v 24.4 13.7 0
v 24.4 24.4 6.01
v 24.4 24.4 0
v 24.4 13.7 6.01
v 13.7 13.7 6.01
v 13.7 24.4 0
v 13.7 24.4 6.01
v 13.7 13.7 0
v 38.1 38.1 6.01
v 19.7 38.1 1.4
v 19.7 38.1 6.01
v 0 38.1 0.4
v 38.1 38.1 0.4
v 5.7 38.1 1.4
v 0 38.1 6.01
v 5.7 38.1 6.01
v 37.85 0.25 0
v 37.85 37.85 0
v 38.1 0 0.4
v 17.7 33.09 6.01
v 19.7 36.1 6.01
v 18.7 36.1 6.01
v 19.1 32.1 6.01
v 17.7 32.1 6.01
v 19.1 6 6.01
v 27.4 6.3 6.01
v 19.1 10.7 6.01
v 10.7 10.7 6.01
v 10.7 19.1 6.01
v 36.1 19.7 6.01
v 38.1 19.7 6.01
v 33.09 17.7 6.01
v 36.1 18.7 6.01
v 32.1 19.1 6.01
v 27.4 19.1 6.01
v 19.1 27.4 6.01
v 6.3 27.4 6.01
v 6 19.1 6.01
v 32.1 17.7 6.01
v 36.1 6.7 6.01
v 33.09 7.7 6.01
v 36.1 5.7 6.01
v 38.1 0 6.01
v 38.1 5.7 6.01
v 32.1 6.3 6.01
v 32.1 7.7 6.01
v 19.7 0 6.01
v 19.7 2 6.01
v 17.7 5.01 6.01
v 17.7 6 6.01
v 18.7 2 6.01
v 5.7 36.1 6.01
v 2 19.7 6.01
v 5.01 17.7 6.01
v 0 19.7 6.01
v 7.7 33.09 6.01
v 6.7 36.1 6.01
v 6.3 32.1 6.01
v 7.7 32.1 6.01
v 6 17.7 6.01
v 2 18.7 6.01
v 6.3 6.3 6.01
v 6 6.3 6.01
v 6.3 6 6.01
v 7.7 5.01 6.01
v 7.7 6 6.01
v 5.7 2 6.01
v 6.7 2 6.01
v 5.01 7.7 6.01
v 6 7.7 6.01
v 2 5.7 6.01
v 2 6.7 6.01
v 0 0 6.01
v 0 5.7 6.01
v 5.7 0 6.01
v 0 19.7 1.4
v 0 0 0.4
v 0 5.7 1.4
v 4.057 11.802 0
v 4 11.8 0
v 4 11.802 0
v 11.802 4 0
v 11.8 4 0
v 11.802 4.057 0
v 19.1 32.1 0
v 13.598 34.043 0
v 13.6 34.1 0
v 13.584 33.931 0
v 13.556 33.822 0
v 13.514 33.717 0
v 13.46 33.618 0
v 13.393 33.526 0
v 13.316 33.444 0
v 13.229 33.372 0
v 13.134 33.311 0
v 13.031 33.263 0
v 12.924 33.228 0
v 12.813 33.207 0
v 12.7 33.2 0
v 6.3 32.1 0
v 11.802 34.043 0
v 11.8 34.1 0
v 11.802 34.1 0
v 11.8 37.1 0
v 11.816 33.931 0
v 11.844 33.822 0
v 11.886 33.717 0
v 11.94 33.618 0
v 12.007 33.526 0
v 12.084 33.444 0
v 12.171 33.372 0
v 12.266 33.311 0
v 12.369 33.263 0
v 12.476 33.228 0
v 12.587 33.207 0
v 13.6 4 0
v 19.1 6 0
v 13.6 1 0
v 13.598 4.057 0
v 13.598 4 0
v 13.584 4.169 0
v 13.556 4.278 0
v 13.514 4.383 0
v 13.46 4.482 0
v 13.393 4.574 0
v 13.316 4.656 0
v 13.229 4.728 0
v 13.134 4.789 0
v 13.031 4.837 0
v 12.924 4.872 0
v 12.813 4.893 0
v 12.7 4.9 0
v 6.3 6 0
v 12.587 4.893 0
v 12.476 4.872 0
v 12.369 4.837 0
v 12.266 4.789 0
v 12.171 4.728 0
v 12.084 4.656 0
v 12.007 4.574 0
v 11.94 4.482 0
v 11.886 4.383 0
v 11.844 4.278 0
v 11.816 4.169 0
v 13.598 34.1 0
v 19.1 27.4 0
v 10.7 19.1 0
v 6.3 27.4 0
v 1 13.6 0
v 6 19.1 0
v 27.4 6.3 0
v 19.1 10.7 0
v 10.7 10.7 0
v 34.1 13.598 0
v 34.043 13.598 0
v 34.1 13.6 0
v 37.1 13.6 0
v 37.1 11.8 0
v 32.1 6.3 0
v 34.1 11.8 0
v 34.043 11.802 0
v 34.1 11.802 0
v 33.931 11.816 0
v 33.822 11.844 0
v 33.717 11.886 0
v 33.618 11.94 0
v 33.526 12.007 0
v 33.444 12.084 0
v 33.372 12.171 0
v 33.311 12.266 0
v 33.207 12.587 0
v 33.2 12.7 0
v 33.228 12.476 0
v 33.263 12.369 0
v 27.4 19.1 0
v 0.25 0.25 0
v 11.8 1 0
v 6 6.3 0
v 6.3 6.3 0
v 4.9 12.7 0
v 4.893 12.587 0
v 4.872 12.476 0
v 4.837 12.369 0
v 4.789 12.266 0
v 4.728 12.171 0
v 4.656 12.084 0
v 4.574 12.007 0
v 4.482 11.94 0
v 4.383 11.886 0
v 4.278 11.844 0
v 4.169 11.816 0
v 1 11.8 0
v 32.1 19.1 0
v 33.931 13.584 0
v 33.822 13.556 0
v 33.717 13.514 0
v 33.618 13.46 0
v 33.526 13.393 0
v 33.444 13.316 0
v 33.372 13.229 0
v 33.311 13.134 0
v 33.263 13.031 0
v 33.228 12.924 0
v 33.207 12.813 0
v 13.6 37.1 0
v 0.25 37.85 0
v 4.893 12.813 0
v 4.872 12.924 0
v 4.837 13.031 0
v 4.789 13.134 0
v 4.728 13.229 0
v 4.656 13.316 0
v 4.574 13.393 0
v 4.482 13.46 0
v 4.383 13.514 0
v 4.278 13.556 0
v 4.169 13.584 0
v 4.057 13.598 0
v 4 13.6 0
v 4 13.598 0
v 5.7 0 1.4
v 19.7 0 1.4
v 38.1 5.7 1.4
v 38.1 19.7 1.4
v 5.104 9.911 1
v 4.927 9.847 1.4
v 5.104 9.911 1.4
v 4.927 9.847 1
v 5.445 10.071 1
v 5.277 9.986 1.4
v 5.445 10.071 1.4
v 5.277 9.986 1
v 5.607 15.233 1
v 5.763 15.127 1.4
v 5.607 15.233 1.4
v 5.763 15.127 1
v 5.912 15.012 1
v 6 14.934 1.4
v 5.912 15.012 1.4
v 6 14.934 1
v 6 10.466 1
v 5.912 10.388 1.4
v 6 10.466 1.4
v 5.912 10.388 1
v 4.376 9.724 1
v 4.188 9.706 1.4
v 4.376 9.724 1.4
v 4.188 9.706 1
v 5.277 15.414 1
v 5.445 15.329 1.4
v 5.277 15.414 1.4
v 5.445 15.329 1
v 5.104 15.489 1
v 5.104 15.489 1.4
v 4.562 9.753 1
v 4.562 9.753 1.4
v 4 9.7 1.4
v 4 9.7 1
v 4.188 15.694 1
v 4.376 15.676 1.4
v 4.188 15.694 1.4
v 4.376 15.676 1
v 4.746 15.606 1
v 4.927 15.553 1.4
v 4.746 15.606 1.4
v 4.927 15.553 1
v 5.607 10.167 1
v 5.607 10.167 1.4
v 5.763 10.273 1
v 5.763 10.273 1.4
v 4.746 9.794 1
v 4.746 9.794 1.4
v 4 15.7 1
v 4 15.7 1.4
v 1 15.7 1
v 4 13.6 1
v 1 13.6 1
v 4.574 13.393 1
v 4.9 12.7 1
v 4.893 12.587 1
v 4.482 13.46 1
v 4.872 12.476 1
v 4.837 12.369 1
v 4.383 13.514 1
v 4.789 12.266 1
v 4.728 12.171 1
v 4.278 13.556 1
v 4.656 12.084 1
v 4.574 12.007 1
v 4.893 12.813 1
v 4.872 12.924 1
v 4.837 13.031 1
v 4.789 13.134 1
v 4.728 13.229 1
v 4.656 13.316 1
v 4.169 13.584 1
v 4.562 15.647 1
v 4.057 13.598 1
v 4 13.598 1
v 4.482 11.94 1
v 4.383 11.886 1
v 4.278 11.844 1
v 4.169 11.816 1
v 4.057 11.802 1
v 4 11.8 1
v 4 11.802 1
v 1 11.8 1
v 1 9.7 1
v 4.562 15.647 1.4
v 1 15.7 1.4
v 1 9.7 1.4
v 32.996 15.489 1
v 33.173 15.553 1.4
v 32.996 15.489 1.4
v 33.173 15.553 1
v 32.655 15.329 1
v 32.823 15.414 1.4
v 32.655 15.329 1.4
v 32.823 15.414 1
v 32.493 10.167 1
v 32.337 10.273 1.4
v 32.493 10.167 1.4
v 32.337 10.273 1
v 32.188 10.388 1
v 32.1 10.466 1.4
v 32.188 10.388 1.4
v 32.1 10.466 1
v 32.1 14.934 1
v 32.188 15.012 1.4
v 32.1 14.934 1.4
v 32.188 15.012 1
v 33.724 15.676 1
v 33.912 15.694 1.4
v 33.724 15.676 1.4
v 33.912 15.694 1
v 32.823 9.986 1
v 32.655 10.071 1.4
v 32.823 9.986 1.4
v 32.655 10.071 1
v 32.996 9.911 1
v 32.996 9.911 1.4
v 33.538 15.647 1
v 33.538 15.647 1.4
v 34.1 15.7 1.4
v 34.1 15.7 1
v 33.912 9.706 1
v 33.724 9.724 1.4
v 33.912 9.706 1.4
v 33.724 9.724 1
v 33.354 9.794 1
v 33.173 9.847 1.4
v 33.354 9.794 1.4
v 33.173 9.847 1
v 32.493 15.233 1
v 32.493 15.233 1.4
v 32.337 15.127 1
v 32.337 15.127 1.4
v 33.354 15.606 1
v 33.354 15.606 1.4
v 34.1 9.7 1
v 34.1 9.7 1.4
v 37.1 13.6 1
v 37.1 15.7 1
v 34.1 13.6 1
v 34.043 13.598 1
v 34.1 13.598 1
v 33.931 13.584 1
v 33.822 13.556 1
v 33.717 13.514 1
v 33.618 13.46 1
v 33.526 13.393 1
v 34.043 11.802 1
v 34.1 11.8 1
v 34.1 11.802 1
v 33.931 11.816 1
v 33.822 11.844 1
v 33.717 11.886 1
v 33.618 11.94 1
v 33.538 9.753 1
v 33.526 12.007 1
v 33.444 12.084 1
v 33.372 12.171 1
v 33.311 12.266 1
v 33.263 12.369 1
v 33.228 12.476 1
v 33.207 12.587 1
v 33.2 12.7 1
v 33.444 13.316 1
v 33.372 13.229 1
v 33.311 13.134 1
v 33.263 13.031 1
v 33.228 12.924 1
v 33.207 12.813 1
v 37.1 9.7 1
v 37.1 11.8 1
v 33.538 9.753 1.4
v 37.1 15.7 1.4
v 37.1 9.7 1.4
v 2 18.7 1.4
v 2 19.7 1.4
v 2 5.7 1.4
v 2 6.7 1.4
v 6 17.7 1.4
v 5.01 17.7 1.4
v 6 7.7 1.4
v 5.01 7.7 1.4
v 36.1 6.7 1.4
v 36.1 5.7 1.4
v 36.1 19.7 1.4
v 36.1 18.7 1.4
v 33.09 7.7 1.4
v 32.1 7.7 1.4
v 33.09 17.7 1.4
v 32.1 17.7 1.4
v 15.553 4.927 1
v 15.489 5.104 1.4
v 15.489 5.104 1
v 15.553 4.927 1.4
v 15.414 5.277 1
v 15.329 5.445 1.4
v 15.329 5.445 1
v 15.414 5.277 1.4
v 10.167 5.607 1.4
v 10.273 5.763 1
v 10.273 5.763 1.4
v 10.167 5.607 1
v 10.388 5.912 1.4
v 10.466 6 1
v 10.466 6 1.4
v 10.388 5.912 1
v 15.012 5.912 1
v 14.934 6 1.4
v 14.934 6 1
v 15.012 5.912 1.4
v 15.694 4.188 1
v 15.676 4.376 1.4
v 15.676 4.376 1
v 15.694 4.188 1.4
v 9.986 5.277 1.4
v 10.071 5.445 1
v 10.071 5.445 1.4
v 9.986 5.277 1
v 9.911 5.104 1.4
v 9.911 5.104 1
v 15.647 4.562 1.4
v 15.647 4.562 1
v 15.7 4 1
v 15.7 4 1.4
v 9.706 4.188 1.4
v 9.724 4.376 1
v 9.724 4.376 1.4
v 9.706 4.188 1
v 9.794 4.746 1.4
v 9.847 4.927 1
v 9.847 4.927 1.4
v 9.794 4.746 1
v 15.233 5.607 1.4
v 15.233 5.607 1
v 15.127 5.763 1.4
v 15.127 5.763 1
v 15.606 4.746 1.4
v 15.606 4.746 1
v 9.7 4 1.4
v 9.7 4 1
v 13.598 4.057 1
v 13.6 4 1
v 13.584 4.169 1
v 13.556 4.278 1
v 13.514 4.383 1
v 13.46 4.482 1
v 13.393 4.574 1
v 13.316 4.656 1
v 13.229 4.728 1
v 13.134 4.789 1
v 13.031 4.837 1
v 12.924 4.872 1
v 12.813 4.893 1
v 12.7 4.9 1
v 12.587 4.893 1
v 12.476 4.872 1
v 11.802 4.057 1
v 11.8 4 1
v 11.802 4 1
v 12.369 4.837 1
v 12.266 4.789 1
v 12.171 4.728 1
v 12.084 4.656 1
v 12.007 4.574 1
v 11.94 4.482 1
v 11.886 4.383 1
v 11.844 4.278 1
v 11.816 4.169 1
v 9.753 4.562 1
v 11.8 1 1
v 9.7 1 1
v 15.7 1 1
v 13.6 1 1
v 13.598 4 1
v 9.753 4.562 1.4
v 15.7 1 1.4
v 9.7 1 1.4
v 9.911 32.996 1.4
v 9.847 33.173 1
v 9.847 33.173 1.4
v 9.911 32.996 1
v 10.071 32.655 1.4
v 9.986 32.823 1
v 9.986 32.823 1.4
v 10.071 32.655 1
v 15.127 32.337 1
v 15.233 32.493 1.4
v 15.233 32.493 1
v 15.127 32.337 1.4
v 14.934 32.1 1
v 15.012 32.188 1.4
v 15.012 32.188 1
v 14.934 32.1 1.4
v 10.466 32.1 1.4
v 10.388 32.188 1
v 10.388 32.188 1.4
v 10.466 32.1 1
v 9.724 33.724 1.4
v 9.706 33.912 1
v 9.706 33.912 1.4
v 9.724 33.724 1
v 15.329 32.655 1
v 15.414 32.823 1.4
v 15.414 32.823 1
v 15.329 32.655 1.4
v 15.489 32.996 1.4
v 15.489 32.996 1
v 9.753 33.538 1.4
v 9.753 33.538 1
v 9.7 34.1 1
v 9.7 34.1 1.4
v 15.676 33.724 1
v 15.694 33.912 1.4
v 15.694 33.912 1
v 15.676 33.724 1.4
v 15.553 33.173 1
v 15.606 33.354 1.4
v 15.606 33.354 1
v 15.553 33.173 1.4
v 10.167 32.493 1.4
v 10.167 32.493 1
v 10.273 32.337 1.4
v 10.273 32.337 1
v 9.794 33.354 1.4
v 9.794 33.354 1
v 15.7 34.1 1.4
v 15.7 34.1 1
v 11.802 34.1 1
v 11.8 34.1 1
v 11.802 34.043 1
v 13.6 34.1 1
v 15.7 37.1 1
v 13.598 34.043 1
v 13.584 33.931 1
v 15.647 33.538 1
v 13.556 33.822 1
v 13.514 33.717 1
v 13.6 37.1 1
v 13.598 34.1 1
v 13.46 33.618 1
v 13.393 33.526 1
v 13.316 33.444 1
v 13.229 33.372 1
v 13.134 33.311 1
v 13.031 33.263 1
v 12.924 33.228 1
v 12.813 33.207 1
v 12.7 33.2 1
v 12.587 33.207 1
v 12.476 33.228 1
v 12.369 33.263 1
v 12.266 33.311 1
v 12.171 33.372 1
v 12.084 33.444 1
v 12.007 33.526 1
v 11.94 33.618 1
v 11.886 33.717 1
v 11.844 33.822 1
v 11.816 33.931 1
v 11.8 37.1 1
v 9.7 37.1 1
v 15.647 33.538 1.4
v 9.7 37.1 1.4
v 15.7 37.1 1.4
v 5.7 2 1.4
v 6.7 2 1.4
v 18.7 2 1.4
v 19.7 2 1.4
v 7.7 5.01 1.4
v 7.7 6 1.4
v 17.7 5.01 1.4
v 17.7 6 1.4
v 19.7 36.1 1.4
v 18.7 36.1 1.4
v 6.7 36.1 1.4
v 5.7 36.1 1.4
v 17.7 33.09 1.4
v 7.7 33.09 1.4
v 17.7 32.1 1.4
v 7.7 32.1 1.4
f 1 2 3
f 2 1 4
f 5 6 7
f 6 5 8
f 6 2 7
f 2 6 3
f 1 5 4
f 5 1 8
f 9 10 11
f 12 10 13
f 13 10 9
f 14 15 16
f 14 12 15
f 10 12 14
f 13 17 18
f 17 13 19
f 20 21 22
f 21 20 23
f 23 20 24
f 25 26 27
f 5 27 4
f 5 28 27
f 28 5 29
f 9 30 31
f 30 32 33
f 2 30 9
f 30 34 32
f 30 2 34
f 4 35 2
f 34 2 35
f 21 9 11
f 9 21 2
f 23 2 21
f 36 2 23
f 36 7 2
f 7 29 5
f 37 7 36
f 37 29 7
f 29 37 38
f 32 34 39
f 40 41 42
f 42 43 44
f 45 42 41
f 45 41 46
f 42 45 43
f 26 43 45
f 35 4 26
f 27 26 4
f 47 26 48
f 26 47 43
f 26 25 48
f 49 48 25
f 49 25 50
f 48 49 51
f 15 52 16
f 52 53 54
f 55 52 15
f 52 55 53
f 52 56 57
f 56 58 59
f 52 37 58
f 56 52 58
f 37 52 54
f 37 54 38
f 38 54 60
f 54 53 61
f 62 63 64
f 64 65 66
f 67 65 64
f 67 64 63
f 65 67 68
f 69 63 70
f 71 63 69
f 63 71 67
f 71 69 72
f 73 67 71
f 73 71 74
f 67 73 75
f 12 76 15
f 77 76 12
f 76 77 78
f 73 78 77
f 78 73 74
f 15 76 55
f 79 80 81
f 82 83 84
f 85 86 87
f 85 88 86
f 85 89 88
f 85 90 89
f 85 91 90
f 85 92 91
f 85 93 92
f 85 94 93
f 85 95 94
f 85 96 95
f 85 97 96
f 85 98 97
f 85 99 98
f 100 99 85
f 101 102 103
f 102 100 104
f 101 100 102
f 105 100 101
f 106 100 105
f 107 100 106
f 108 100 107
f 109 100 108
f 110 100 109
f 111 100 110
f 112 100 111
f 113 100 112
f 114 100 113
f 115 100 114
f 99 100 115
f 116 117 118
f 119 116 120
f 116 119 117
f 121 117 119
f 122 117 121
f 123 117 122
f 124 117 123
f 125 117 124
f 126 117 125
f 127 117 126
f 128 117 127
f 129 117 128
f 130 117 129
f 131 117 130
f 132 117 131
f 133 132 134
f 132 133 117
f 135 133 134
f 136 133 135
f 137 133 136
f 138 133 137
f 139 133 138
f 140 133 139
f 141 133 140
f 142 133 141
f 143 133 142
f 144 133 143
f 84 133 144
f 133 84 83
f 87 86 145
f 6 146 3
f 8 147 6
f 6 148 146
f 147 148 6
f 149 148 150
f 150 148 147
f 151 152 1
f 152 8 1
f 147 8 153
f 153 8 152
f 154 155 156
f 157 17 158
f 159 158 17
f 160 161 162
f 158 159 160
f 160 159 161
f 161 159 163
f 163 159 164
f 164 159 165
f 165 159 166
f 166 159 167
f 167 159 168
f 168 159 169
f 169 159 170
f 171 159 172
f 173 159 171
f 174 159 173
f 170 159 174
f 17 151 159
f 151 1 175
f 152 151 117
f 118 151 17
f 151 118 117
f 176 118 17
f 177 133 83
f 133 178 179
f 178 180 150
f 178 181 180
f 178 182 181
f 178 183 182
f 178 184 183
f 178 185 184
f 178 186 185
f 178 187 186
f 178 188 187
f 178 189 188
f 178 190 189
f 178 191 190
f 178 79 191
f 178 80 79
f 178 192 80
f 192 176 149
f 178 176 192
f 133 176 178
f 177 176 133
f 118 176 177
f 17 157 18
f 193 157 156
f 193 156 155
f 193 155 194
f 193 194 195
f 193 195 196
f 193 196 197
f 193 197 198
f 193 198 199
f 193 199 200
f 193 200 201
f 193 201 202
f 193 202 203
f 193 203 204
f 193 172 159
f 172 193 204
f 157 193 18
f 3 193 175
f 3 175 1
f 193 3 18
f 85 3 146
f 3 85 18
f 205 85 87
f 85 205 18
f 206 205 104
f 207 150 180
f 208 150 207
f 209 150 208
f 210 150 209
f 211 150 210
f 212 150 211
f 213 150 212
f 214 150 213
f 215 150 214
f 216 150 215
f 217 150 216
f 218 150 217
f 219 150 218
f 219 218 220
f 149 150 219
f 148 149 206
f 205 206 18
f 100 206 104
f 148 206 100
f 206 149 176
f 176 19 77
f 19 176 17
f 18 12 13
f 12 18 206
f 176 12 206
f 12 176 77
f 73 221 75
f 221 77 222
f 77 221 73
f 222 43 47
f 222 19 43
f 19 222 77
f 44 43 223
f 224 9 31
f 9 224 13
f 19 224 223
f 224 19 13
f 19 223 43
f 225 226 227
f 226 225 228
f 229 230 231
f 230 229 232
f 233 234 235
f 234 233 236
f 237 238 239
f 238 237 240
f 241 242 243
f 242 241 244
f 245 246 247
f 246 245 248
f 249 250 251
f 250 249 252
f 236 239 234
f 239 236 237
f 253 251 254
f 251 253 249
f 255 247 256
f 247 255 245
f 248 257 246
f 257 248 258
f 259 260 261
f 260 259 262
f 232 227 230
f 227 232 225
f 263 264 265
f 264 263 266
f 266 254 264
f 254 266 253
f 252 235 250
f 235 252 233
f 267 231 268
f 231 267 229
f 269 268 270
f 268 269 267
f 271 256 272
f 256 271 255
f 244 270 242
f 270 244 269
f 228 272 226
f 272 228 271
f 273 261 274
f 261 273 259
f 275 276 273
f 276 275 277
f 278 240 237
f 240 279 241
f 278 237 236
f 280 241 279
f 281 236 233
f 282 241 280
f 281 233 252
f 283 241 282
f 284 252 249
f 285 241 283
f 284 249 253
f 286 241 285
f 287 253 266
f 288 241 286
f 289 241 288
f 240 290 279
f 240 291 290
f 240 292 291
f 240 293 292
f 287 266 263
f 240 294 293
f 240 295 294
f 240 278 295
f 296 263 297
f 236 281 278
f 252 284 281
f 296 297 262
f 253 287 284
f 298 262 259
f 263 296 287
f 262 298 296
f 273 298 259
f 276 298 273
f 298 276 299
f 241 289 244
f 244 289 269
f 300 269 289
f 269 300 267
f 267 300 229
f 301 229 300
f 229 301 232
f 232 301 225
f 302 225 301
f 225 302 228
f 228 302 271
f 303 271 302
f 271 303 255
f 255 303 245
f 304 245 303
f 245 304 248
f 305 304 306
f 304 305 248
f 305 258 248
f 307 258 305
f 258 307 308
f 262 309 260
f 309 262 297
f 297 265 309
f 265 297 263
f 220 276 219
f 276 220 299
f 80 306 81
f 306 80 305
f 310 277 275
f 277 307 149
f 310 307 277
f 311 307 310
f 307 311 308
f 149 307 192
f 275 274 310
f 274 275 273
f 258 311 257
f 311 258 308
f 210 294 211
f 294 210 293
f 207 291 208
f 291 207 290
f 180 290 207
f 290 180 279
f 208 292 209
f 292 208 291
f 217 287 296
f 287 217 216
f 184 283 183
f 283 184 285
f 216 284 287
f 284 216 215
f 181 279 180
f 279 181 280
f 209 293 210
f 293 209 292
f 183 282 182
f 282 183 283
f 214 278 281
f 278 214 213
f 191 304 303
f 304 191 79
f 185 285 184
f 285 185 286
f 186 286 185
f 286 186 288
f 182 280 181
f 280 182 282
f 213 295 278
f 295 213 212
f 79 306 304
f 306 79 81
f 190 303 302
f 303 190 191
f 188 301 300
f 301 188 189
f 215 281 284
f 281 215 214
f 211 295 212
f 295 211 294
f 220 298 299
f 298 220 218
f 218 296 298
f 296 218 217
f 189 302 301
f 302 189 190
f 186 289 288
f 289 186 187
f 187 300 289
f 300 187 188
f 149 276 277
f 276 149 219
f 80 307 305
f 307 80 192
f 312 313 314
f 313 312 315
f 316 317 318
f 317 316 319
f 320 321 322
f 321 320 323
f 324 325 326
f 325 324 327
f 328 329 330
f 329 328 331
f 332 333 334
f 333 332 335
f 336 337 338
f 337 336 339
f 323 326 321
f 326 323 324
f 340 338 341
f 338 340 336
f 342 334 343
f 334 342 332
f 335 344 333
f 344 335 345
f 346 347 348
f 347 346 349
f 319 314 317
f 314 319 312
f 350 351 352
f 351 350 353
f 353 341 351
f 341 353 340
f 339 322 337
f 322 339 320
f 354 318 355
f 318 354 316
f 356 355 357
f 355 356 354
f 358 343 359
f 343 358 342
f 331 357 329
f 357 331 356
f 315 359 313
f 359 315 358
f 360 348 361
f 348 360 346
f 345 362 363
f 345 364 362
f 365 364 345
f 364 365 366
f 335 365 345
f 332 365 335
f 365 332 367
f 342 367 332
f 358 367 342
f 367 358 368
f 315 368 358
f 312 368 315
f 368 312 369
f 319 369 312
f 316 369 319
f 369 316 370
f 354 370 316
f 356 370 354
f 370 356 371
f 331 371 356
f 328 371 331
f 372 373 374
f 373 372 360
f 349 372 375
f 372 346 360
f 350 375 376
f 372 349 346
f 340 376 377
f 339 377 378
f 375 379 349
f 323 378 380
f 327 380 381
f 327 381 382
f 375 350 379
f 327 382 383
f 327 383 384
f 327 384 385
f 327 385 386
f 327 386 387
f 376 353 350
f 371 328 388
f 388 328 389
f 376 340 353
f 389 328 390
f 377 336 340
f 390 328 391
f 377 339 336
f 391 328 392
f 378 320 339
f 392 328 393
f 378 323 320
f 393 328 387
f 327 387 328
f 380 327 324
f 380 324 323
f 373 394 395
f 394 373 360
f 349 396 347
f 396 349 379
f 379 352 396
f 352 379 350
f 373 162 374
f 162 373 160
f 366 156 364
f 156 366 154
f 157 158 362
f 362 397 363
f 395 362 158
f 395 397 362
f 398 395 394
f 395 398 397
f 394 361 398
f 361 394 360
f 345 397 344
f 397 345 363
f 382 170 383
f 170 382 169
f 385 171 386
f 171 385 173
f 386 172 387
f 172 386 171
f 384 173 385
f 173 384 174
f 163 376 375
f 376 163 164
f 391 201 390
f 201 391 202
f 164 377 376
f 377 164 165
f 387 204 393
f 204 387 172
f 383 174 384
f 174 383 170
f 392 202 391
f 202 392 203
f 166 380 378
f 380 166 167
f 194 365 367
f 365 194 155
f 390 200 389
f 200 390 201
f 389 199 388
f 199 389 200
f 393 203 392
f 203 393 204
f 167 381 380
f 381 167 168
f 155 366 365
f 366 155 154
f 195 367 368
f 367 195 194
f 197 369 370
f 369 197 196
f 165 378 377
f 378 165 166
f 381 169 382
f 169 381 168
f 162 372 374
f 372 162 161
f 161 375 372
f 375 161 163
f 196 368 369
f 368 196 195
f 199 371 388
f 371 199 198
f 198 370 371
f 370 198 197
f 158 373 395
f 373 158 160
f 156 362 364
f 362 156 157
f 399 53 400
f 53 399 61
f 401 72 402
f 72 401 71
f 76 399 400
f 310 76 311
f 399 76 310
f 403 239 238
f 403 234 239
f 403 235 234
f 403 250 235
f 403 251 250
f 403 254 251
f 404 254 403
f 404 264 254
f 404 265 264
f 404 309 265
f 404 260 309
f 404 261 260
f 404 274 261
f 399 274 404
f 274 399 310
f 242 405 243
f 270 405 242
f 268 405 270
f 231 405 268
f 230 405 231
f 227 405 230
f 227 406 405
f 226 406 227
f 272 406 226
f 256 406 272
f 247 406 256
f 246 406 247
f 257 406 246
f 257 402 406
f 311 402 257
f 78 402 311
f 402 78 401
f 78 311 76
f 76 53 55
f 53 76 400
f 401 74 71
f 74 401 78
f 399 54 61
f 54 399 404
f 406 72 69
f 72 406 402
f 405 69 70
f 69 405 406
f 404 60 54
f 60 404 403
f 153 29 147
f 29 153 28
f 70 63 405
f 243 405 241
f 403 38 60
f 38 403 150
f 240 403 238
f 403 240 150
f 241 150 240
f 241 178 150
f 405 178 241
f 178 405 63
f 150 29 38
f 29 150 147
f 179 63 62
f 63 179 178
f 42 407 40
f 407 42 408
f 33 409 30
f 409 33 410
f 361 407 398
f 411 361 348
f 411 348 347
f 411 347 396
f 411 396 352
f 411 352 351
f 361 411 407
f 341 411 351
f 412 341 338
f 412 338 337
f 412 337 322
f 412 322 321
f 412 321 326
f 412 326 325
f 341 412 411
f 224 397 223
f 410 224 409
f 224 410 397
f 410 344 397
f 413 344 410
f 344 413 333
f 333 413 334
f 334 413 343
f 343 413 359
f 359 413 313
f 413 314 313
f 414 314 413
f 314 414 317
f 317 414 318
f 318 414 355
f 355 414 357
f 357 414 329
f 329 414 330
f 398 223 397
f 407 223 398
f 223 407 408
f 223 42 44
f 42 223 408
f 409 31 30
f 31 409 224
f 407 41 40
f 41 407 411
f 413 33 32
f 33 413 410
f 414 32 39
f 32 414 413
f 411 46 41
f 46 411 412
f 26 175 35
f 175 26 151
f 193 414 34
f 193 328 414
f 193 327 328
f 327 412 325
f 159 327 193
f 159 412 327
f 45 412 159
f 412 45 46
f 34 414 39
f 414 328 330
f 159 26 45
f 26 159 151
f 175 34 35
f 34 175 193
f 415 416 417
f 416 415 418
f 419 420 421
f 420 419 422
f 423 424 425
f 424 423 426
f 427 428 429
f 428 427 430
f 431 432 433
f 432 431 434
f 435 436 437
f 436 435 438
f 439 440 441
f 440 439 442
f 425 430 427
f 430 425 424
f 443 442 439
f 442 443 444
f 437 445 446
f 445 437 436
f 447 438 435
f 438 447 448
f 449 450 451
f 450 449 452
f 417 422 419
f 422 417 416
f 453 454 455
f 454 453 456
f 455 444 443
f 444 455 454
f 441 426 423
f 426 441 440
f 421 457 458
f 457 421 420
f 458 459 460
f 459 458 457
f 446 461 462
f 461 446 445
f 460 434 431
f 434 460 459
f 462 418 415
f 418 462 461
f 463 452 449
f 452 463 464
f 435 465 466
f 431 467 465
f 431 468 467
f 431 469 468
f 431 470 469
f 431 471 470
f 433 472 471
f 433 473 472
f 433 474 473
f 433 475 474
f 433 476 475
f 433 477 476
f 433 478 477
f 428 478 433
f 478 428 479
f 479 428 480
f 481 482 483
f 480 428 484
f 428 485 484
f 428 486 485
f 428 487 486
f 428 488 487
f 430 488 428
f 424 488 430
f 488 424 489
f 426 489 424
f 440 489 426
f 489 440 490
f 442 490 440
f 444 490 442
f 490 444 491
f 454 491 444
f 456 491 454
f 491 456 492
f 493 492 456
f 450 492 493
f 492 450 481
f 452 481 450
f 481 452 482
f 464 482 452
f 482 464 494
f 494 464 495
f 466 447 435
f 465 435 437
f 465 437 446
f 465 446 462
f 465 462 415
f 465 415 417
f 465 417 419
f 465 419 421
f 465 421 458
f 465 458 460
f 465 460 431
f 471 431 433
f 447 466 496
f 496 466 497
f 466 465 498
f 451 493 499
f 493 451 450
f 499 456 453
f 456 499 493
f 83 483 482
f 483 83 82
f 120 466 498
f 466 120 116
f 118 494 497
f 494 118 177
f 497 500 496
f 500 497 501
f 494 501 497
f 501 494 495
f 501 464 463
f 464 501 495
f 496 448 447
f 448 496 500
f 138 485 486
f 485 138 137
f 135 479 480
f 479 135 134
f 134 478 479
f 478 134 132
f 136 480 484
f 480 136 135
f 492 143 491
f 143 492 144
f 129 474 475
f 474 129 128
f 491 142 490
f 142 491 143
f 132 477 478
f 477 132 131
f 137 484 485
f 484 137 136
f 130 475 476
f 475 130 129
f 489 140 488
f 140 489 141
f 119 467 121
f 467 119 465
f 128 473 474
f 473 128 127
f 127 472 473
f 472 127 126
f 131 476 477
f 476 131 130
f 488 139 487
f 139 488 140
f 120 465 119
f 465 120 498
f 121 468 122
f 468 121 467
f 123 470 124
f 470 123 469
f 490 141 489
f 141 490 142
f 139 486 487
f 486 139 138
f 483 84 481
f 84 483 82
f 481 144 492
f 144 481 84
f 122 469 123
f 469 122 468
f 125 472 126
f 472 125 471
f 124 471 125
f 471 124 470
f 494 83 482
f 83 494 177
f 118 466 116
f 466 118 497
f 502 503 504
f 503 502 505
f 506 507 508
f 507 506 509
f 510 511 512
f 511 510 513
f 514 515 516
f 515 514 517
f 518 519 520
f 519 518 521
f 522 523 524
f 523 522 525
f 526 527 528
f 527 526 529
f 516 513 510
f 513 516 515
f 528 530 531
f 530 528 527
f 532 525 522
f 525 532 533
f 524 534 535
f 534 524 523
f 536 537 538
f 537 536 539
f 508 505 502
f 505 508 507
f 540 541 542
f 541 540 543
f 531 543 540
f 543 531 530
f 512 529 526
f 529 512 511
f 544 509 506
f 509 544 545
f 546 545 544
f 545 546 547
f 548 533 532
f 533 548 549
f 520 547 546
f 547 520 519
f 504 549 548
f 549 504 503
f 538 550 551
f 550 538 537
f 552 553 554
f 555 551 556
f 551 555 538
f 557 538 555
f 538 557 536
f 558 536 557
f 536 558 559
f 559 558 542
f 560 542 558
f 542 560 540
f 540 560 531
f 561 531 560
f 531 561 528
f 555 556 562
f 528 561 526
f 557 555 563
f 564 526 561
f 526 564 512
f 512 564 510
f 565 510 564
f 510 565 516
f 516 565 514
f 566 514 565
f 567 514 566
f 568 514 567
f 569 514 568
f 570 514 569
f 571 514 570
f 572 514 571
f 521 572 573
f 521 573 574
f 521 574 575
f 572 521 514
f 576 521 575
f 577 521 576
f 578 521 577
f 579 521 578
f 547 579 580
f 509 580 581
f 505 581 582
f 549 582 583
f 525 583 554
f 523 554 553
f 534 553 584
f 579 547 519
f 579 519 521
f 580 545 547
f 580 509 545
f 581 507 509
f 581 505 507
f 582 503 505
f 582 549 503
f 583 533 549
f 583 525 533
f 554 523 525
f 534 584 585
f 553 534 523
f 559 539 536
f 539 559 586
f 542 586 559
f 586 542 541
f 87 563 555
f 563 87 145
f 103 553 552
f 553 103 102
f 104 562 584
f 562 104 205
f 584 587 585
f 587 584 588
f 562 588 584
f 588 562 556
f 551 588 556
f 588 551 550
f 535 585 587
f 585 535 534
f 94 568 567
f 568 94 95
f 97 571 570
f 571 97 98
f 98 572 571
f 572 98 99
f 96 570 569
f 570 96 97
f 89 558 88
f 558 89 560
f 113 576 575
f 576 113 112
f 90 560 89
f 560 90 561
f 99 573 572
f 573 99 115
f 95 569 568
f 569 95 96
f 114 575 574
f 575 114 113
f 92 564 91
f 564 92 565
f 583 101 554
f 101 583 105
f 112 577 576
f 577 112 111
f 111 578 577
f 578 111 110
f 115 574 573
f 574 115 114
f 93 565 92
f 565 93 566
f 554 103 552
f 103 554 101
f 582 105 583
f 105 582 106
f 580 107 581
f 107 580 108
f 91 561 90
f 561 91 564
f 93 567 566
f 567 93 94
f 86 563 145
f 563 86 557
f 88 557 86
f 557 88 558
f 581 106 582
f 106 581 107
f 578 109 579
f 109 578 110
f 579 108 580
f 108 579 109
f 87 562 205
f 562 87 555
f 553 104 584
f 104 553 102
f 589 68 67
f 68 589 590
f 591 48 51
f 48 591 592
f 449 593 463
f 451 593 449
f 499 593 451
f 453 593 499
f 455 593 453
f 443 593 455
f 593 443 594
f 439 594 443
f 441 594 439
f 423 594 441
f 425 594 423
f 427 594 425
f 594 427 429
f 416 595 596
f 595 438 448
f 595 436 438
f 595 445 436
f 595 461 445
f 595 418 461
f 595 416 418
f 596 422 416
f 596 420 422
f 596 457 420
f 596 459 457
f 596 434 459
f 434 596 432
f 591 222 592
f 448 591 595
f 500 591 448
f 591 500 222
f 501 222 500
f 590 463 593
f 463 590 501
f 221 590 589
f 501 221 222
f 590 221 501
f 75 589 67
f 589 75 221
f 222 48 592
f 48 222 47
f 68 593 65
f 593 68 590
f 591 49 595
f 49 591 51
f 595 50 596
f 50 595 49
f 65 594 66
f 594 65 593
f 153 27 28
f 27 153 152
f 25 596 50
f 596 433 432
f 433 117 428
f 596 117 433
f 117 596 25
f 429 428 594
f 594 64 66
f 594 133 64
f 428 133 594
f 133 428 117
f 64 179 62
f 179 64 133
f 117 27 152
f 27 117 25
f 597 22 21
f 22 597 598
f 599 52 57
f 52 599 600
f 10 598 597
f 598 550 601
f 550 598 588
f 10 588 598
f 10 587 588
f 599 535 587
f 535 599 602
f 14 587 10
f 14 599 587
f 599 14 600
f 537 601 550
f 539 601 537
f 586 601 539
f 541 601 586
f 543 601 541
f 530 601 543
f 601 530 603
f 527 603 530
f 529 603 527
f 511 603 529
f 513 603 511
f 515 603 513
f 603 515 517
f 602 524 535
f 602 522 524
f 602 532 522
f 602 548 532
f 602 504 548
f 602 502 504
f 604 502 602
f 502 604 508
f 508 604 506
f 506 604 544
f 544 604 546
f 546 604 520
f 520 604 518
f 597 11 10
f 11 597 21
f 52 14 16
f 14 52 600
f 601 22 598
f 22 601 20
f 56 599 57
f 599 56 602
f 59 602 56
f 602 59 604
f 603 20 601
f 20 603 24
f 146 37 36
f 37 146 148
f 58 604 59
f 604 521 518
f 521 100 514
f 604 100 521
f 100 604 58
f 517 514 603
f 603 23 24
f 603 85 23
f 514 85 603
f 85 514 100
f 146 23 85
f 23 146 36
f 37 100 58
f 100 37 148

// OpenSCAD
// file: lock_flex_magnetic.scad
/*
 * Flex Magnet
 */
module flex_magnetic_positive(magnet_hole=6) {
    if (magnet_hole > 0) {
        translate([magnet_hole/2+1,0,0]) cylinder(.41,magnet_hole/2+1-.25,magnet_hole/2+1, $fn=100);
        translate([magnet_hole/2+1,0,0.4]) cylinder(5.6,magnet_hole/2+1,magnet_hole/2+1, $fn=100);
        hull() {
            translate([0.25,-magnet_hole/2-1+.25,0]) cube([magnet_hole/2+1-.25,magnet_hole+2-.5,1]);
            translate([0,-magnet_hole/2-1,.4]) cube([magnet_hole/2+1,magnet_hole+2,5.6]);
        }
    }
}

module flex_magnetic_negative(magnet_hole=6) {
    if (magnet_hole > 0) {
        translate([magnet_hole/2+1,0,1]) cylinder(8,magnet_hole/2,magnet_hole/2, $fn=100);
        translate([1,-magnet_hole/2,1]) cube([magnet_hole/2,magnet_hole,8]);
        translate([magnet_hole/2+1,0,-1]) cylinder(10,.9,.9,$fn=50);
        translate([1,-.9,-1]) cube([magnet_hole/2,.9*2,10]);
    }
}

module flex_magnetic_hex(square_basis, magnet_hole=6) {
    if (magnet_hole > 0) {
        hull() {
            translate([square_basis/2,0,0]) rotate([0,0,90]) translate([magnet_hole/2+1,0,1]) cylinder(8,magnet_hole/2,magnet_hole/2, $fn=100);
            rotate([0,0,-120]) mirror([1,0,0]) translate([square_basis/2,0,0]) rotate([0,0,90]) translate([magnet_hole/2+1,0,1]) cylinder(8,magnet_hole/2,magnet_hole/2, $fn=100);
        }
        translate([square_basis/2,0,0]) rotate([0,0,90]) union() {
            //translate([magnet_hole/2+1,0,1]) cylinder(8,magnet_hole/2,magnet_hole/2, $fn=100);
            translate([1,-magnet_hole/2,1]) cube([magnet_hole/2,magnet_hole,8]);
            translate([magnet_hole/2+1,0,-1]) cylinder(10,.9,.9,$fn=50);
            translate([1,-.9,-1]) cube([magnet_hole/2,.9*2,10]);
        }
        rotate([0,0,-120]) mirror([1,0,0]) translate([square_basis/2,0,0]) rotate([0,0,90]) union() {
            //translate([magnet_hole/2+1,0,1]) cylinder(8,magnet_hole/2,magnet_hole/2, $fn=100);
            translate([1,-magnet_hole/2,1]) cube([magnet_hole/2,magnet_hole,8]);
            translate([magnet_hole/2+1,0,-1]) cylinder(10,.9,.9,$fn=50);
            translate([1,-.9,-1]) cube([magnet_hole/2,.9*2,10]);
        }
    }
}
// file: lock_magnetic.scad
/*
 * Magnets
 */
 
module magnetic_positive(magnet_hole=6, height=6) {
    if (magnet_hole > 0) {
        translate([magnet_hole/2+1,0,0]) cylinder(.41,magnet_hole/2+1-.25,magnet_hole/2+1, $fn=100);
        translate([magnet_hole/2+1,0,0.4]) cylinder(height-.4,magnet_hole/2+1,magnet_hole/2+1, $fn=100);
    }
}

module magnetic_negative(magnet_hole=6, height=8) {
    if (magnet_hole > 0) {
        translate([magnet_hole/2+1,0,1]) cylinder(height+2,magnet_hole/2,magnet_hole/2, $fn=100);
        translate([magnet_hole/2+1,0,-1]) cylinder(10,.9,.9,$fn=50);
    }
}
// file: lock_openlock_topless.scad
/*
 * Openlock Topless connection bay
 */

module openlock_topless_chamber(buffer=0, height=6) {
    translate([-buffer,-7,1.4]) cube([2+buffer,7*2,height+1]);
    hull() {
        translate([0,-6,1.4]) cube([2,6*2,height+1]);
        translate([3+0.01,-5,1.4]) cube([2,5*2,height+1]);
    }
    hull() {
        translate([5,-5,1.4]) cube([1,5*2,height+1]);
        translate([6,-5,1.4]) cube([1,5*2,height+1]);
    }
    translate([6,-6.4,-1]) cube([4.7,6.4*2,height+3.4]);
}

module openlock_topless_positive(height=6) {
    translate([0,-8,0.4]) cube([2,16,height-.4]); 
}

module openlock_topless_negative(supports=true, height=6) {
    difference() {
        openlock_topless_chamber(1, height=height);
    }
}
// file: lock_openlock.scad
/*
 * Openlock connection bay
 */

module openlock_chamber(buffer=0) {
    add = TOPLESS == "true" ? 10 : 0;
    translate([-buffer,-7,1.4]) cube([2+buffer,7*2,4.2+add]);
    hull() {
        translate([0,-6,1.4]) cube([2,6*2,4.2+add]);
        translate([3+0.01,-5,1.4]) cube([2,5*2,4.2+add]);
    }
    hull() {
        translate([5,-5,1.4]) cube([1,5*2,4.2+add]);
        translate([6,-5,1.4]) cube([1,5*2,4.7]);
    }
    translate([6,-6.4,-1]) cube([4.7,6.4*2,7.1]);
}

module openlock_supports() {
    module support() {
        translate([-1.1,2.05,1.2]) cube([3.1,1,4.6]);
        hull() {
            translate([-1.1,2.05,1.4]) cube([3.1,1,2.1]);
            translate([-1.1,2.05-.2,1.9]) cube([3.1,1.4,1.1]);
        }
        hull() {
            translate([-1.1,2.05,3.5]) cube([3.1,1,2.1]);
            translate([-1.1,2.05-.2,4.0]) cube([3.1,1.4,1.1]);
        }
    }
    if (TOPLESS != "true") {
        support();
        mirror([0,1,0]) support();
    }
}

module openlock_positive() {
    translate([0,-8,0.4]) cube([2,16,5.6]); 
}

module openlock_negative(supports=true) {
    difference() {
        openlock_chamber(1);
        if(supports == "true") {
            openlock_supports();
        }
    }
}

module openlock_wall_negative(supports=true) {
    translate([0,0,0]) difference() {
        translate([0,0,1.4]) linear_extrude(height=4.2) {
            polygon([
                [-7.35,7],[-5.35,7],[-5.35,6],
                [-2.35,5],[2.35,5],
                [5.35,6],[5.35,7],[7.35,7],
                [7.35,-7],[5.35,-7],[5.35,-6],
                [2.35,-5],[-2.35,-5],
                [-5.35,-6],[-5.35,-7],[-7.35,-7]]);
        }
        if(supports) {
            translate([-6.35,0,0]) openlock_supports();
            rotate([0,0,180]) translate([-6.35,0,0]) openlock_supports();
        }
    }
}

module openlock_wall_positive() {
    translate([-6.35,-8,0.4]) cube([12.7,16,5.6]); 
}

module openlock_sidelock_negative() {
    
    translate([0,0,7]) rotate([90,0,0]) translate([0,0,-2.1]) linear_extrude(height=4.2) {
        polygon([[-1,-7],[-1,7],[2,7],[2,6],[5,5],[5.9,5],[5.9,5.26],[5.9+4.53,5.26],
            [5.9+4.53,-5.26],[5.9,-5.26],[5.9,-5],[5,-5],[2,-6],[2,-7]]);
    }
}

module openlock_sidelock_positive() {
    translate([0,-3.1,-8]) cube([11.43,6.2,16]);
}
// file: lock_infinitylock.scad
/*
 * Infinity Lock connection bay
 */
module infinitylock_positive() {
    translate([0,-6.6,0.4]) cube([2,6.6*2,5.6]); 
}

module infinitylock_negative() {
    translate([-1,-5.6,1.4]) cube([2.6,5.6*2,4.2]);

    hull() {
        translate([0,-3.83,1.4]) cube([1.6,3.83*2,4.2]);
        translate([0,-3.36,1.4]) cube([2.15,3.36*2,4.2]);
    }
    translate([0,-3.36,1.4]) cube([2.8,3.36*2,4.2]);
    hull() {
        translate([2.7,-3.36,1.4]) cube([2.7,3.36*2,4.2]);
        translate([3.84,-3.83,1.4]) cube([1,3.83*2,4.2]);
    }
    translate([4.8,-3.83,-1]) cube([3.44,3.83*2,6.6]);
}
// file: lock_dragonlock.scad
/*
 * Dragonlock connection bay
 */

module dragonlock_interior_a(north=true,south=true,east=true,west=true) {
    module edge() {
        difference() {
            hull() {
                translate([3.17,-12.67,-1]) cube([8.512,12.67*2,6]);
                translate([3.145,-12.7,-1]) cube([8.512,12.67*2,6.206]);
            }
            translate([10.29,-12.8,5.206]) rotate([0,45,0]) cube([8.512,12.8*2,6.206]);
        }
    }
    
    translate([0,25.4,0]) {
        difference() {
            translate([12.7,-12.7,-1]) cube([50.8-12.7*2,50.8-12.7*2,6.206]);
            translate([25.4,0,0]) rotate([0,0,45]) translate([-.75,-30,-2]) cube([1.5,60,20]);
            translate([25.4,0,0]) rotate([0,0,-45]) translate([-.75,-30,-2]) cube([1.5,60,20]);
        }

        if (!west) {
            edge();
        }
        if (!south) {
            translate([25.4,-25.4,0]) rotate([0,0,90]) edge();
        }
        if (!east) {
            translate([50.8,0,0]) rotate([0,0,180]) edge();
        }
        if (!north) {
            translate([25.4,25.4,0]) rotate([0,0,270]) edge();
        }
        dragonlock_nub();
        translate([25.4,-25.4,0]) rotate([0,0,90]) dragonlock_nub();
        translate([50.8,0,0]) rotate([0,0,180]) dragonlock_nub();
        translate([25.4,25.4,0]) rotate([0,0,270]) dragonlock_nub();
    }
}

module dragonlock_interior_b(north=true,south=true,east=true,west=true) {
    translate([0,25.4,0]) {
        if (west) {
            dragonlock_negative();
        }
        if (south) {
            translate([25.4,-25.4,0]) rotate([0,0,90]) dragonlock_negative();
        }
        if (east) {
            translate([50.8,0,0]) rotate([0,0,180]) dragonlock_negative();
        }
        if (north) {
            translate([25.4,25.4,0]) rotate([0,0,270]) dragonlock_negative();
        }
    }
}


module dragonlock_positive() {
    translate([0,-7.8418,0.4]) cube([2,7.8418*2,5.6]);
}

module dragonlock_negative(supports=true) {
    difference() {
        union() {
            translate([-1,-6.8418,1.3695]) cube([5.1,6.8418*2,3.225]);
            hull() {
                translate([3.17,-7.62,-1]) cube([7.9634,7.62*2,4.81]);
                translate([3.17,-7.62,-1]) cube([7.735,7.62*2,5.5945]);
            }
        }
        if(supports) {
            translate([-1.1,-.25,0]) cube([4.262,.5,5]);
            translate([-1.1,3.59-.25,0]) cube([7.1,.5,5]);
            translate([-1.1,-3.59-.25,0]) cube([7.1,.5,5]);
        }
        translate([3,-3.9095,-1.1]) cube([10,3.9095*2,2.4695]);
        translate([3,-4.7685,-1.1]) rotate([0,0,39.15]) cube([5,5,2.4695]);
        mirror([0,1,0]) translate([3,-4.7685,-1.1]) rotate([0,0,39.15]) cube([5,5,2.4695]);
        translate([7,-2.12,-1]) cube([5,2.12*2,10]);
        translate([8.069,0,-1]) cylinder(10,2.815,2.811,$fn=50);

        difference() {
            translate([8.069,0,-1.1]) cylinder(2.4695,4.62,4.62,$fn=50);
            translate([3,-5,-1.2]) cube([10,10,1.2]);
        }
    }
}
// file: impl_square.scad
include <connectors.scad>

/*
 * Connector Positive
 */
module connector_positive_square(x,y,square_basis,edge_width,north=true,south=true,east=true,west=true) {
    for ( i = [0 : y-1] ) {
        if(west) {
            translate([0,square_basis*(i+1)-square_basis/2,0]) center_connector_positive(y);
        }
        if(east) {
            translate([square_basis*x,square_basis*(i+1)-square_basis/2,0]) rotate([0,0,180]) center_connector_positive(y);
        }
    }
    if (y > 1) {
        for ( i = [1 : y-1] ) {
            if(west) {
                translate([0,square_basis*i,0]) joint_connector_positive(y);
            }
            if(east) {
                translate([square_basis*x,square_basis*i,0]) rotate([0,0,180]) joint_connector_positive(y);
            }
        }
    }
    for ( i = [0 : x-1] ) {
        if(south) {
            translate([square_basis*(i+1)-square_basis/2,0,0]) rotate([0,0,90]) center_connector_positive(x);
        }
        if(north) {
            translate([square_basis*(i+1)-square_basis/2,square_basis*y,0]) rotate([0,0,-90]) center_connector_positive(x);
        }
    }
    if (x > 1) {
        for ( i = [1 : x-1] ) {
            if(south) {
                translate([square_basis*i,0,0]) rotate([0,0,90]) joint_connector_positive(y);
            }
            if(north) {
                translate([square_basis*i,square_basis*y,0]) rotate([0,0,-90]) joint_connector_positive(y);
            }
        }
    }
}

module connector_positive_square_notch(x,y,square_basis,edge_width,north=true,south=true,east=true,west=true) {
    if(NOTCH == "true") {
        connector_positive_square(x,y,square_basis,edge_width,north=north,south=false,east=east,west=false);
        if(south) {
            translate([square_basis*NOTCH_X,0,0]) connector_positive_square(x-NOTCH_X,y-NOTCH_Y,square_basis,edge_width,north=false,south=true,east=false,west=false);
            translate([0,square_basis*NOTCH_Y,0]) connector_positive_square(NOTCH_X,NOTCH_Y,square_basis,edge_width,north=false,south=true,east=false,west=false);
        }
        if(west) {
            translate([square_basis*NOTCH_X,0,0]) connector_positive_square(NOTCH_X,NOTCH_Y,square_basis,edge_width,north=false,south=false,east=false,west=true);
            translate([0,square_basis*NOTCH_Y,0]) connector_positive_square(x-NOTCH_X,y-NOTCH_Y,square_basis,edge_width,north=false,south=false,east=false,west=true);
        }
    } else {
        connector_positive_square(x,y,square_basis,edge_width,north,south,east,west);
    }
}

/*
 * Connector Negative
 */
module connector_negative_square(x,y,square_basis,edge_width,north=true,south=true,east=true,west=true) {
    for ( i = [0 : y-1] ) {
        if(west) {
            translate([0,square_basis*(i+1)-square_basis/2,0]) center_connector_negative(y, PRIORITY, LOCK, MAGNETS, MAGNET_HOLE);
        }
        if(east) {
            translate([square_basis*x,square_basis*(i+1)-square_basis/2,0]) rotate([0,0,180]) center_connector_negative(y, PRIORITY, LOCK, MAGNETS, MAGNET_HOLE);
        }
    }
    if (y > 1) {
        for ( i = [1 : y-1] ) {
            if(west) {
                translate([0,square_basis*i,0]) joint_connector_negative(y);
            }
            if(east) {
                translate([square_basis*x,square_basis*i,0]) rotate([0,0,180]) joint_connector_negative(y);
            }
        }
    }
    for ( i = [0 : x-1] ) {
        if(south) {
            translate([square_basis*(i+1)-square_basis/2,0,0]) rotate([0,0,90]) center_connector_negative(x, PRIORITY, LOCK, MAGNETS, MAGNET_HOLE);
        }
        if(north) {
            translate([square_basis*(i+1)-square_basis/2,square_basis*y,0]) rotate([0,0,-90]) center_connector_negative(x, PRIORITY, LOCK, MAGNETS, MAGNET_HOLE);
        }
    }
    if (x > 1) {
        for ( i = [1 : x-1] ) {
            if(south) {
                translate([square_basis*i,0,0]) rotate([0,0,90]) joint_connector_negative(y);
            }
            if(north) {
                translate([square_basis*i,square_basis*y,0]) rotate([0,0,-90]) joint_connector_negative(y);
            }
        }
    }
}

module connector_negative_square_notch(x,y,square_basis,edge_width,north=true,south=true,east=true,west=true) {
    if(NOTCH == "true") {
        connector_negative_square(x,y,square_basis,edge_width,north=north,south=false,east=east,west=false);
        if(south) {
            translate([square_basis*NOTCH_X,0,0]) connector_negative_square(x-NOTCH_X,y-NOTCH_Y,square_basis,edge_width,north=false,south=true,east=false,west=false);
            translate([0,square_basis*NOTCH_Y,0]) connector_negative_square(NOTCH_X,NOTCH_Y,square_basis,edge_width,north=false,south=true,east=false,west=false);
        }
        if(west) {
            translate([square_basis*NOTCH_X,0,0]) connector_negative_square(NOTCH_X,NOTCH_Y,square_basis,edge_width,north=false,south=false,east=false,west=true);
            translate([0,square_basis*NOTCH_Y,0]) connector_negative_square(x-NOTCH_X,y-NOTCH_Y,square_basis,edge_width,north=false,south=false,east=false,west=true);
        }
    } else {
        connector_negative_square(x,y,square_basis,edge_width,north,south,east,west);
    }
}

/*
 * Plain base exterior
 */
module plain_square(x,y,square_basis,edge_width) {
    difference() {
        plain_square_positive(x,y,square_basis);
        edge = LOCK == "dragonlock" ? square_basis/2 : edge_width;
        plain_square_negative(x,y,square_basis,edge);
    }
}

module plain_square_positive(x,y,square_basis) {
    difference() {
        hull() {
            translate([0,0,0.4]) cube([square_basis*x, square_basis*y, 6-.39]);
            translate([0.25,0.25,0]) cube([square_basis*x-.5, square_basis*y-.5, 1]);
        }
        if(NOTCH == "true") {
            translate([-1,-1,-1]) cube([square_basis*NOTCH_X+1, square_basis*NOTCH_Y+1, 8]);
            hull() {
                translate([-1,-1,0]) cube([square_basis*NOTCH_X+1, square_basis*NOTCH_Y+1, .4]);
                translate([-1,-1,-0.01]) cube([square_basis*NOTCH_X+1.25, square_basis*NOTCH_Y+1.25, 0.01]);
            }
        }
    }
}

module plain_square_negative(x,y,square_basis,edge_width) {
    difference() {
        intersection() {
            translate([edge_width,edge_width,0]) translate([1,1,-1]) cube([square_basis*x-((edge_width+1)*2),square_basis*y-((edge_width+1)*2),8]);
            difference() {
                translate([edge_width,edge_width,0]) translate([1,1,-1]) cube([square_basis*x-((edge_width+1)*2),square_basis*y-((edge_width+1)*2),8]);
                if(NOTCH == "true") {
                    translate([0,0,0.4]) cube([square_basis*NOTCH_X+edge_width+1, square_basis*NOTCH_Y+edge_width+1, 6]);
                    translate([0.25,.25,0]) cube([square_basis*NOTCH_X+edge_width+1-.5, square_basis*NOTCH_Y+edge_width+1-.5, .4]);
                }
            }
        }
        if (CENTER == "true") {
            for ( i = [2 : 2 : y-1] ) {
                translate([0,(i-.125)*square_basis,-2]) cube([square_basis*x,square_basis/4,10]);
            }
            for ( i = [2 : 2 : y-1] ) {
                translate([(i-.125)*square_basis,0,-2]) cube([square_basis/4,square_basis*y,10]);
            }
        }
    }
}
// main file
/* [Base Tile Size] */
// How many squares on the X axis
x = 2; //[2,3,4,5,6,7,8]
// How many squares on the Y axis
y = 2; //[2,3,4,5,6,7,8]
// How tall is the tile in mm on the Z axis
HEIGHT = 6; // 6 is default

/* [Square Basis] */
// What is the size in mm of a square?
SQUARE_BASIS = "inch"; // [25mm:25mm - Dwarven Forge/Hirstarts, inch:inch (25.4) - OpenLOCK/Dragonlock/Dungeonworks, wyloch:1 1/4 inch (31.75) - Wyloch, drc:1 1/2 inch (38.1) - Dragon's Rest]

/* [Lock] */
// Dragonlock - connector between squares, pips on either side for stacking
// InfinityLock - connector between squares and in the middle of squares
// OpenLOCK - connector between squares
// OpenLOCK Triplex - connector between squares and in the middle of squares
// OpenLOCK Topless - openlock, but without a top
// Select the type of clip lock
LOCK = "openlock";// [openlock,triplex,infinitylock,dragonlock,none]
// If OpenLock remove top of openlock bays
TOPLESS = "true"; // [true, false]
// If Openlock, do we want supports?
SUPPORTS = "true"; // [true, false]
// Only use clips on the wall facing side
WALL_LOCKS = "false"; // [true, false]


 /* [Magnets] */
// Use magnets or not.
MAGNETS = "flex_magnetic"; // [magnetic,flex_magnetic,none]
// Size of hole for magnet.  6 works well for 5mm buckyball style magnets.
MAGNET_HOLE = 6;

/* [Priority] */
// Do you want lock or magnets to win when the two conflict
PRIORITY = "lock"; // [lock,magnets]




include <impl_square.scad>

/*
 * Top Level Function
 */
module base_square(x,y,square_basis) {
    tmp_edge_width = MAGNET_HOLE >= 5.55 ? MAGNET_HOLE + 1 : 6.55;
    electronics = (x <= 2 || y <= 2) && ELECTRONICS == "true";
    edge_width = ((PRIORITY == "lock" && (x == 1 || y == 1)) || LOCK == "triplex" || LOCK == "openlock" && MAGNETS == "none" || LOCK == "openlock_topless" && MAGNETS == "none") || electronics ? tmp_edge_width : square_basis/2 ;

    difference() {
        union() {
            plain_square(x-.5,y-.5,square_basis,edge_width);
            connector_positive_square(x-.5,y-.5,square_basis,edge_width);
        }
        if (WALL_LOCKS == "true") {
            connector_negative_square(x-.5,y-.5,square_basis,edge_width,north=false,east=false);
            connector_negative_square(x-.5,y-.5,square_basis,edge_width,south=false,west=false,magnets="none",priority="lock") ;
        } else {
            connector_negative_square(x-.5,y-.5,square_basis,edge_width);
        }
    }
}

function keyLookup (data, key) = search(key, data, num_returns_per_match=1)[0];

NOTCH = "false";
ELECTRONICS = "false";
CENTER = "false";

basis = [
    ["25mm", 25],
    ["inch", 25.4],
    ["wyloch", 31.75],
    ["drc", 38.1]
];
square_basis_number = basis[keyLookup(basis, [SQUARE_BASIS])][1];
wall_width = 10.2*square_basis_number/25;

// Compatability
valid_dragonlock_basis = (SQUARE_BASIS == "inch");
valid_infinitylock_basis = (SQUARE_BASIS == "inch");

if (LOCK == "dragonlock" && !valid_dragonlock_basis) {
    echo("ERROR: dragonlock is only compatible with inch basis");
} else if (LOCK == "infinitylock" && !valid_infinitylock_basis) {
    echo("ERROR: infinitylock is only compatible with inch basis");
} else {
    color("Grey") base_square(x,y,square_basis_number);
}

//plain_base(x,y,square_basis_number,shape,7);
